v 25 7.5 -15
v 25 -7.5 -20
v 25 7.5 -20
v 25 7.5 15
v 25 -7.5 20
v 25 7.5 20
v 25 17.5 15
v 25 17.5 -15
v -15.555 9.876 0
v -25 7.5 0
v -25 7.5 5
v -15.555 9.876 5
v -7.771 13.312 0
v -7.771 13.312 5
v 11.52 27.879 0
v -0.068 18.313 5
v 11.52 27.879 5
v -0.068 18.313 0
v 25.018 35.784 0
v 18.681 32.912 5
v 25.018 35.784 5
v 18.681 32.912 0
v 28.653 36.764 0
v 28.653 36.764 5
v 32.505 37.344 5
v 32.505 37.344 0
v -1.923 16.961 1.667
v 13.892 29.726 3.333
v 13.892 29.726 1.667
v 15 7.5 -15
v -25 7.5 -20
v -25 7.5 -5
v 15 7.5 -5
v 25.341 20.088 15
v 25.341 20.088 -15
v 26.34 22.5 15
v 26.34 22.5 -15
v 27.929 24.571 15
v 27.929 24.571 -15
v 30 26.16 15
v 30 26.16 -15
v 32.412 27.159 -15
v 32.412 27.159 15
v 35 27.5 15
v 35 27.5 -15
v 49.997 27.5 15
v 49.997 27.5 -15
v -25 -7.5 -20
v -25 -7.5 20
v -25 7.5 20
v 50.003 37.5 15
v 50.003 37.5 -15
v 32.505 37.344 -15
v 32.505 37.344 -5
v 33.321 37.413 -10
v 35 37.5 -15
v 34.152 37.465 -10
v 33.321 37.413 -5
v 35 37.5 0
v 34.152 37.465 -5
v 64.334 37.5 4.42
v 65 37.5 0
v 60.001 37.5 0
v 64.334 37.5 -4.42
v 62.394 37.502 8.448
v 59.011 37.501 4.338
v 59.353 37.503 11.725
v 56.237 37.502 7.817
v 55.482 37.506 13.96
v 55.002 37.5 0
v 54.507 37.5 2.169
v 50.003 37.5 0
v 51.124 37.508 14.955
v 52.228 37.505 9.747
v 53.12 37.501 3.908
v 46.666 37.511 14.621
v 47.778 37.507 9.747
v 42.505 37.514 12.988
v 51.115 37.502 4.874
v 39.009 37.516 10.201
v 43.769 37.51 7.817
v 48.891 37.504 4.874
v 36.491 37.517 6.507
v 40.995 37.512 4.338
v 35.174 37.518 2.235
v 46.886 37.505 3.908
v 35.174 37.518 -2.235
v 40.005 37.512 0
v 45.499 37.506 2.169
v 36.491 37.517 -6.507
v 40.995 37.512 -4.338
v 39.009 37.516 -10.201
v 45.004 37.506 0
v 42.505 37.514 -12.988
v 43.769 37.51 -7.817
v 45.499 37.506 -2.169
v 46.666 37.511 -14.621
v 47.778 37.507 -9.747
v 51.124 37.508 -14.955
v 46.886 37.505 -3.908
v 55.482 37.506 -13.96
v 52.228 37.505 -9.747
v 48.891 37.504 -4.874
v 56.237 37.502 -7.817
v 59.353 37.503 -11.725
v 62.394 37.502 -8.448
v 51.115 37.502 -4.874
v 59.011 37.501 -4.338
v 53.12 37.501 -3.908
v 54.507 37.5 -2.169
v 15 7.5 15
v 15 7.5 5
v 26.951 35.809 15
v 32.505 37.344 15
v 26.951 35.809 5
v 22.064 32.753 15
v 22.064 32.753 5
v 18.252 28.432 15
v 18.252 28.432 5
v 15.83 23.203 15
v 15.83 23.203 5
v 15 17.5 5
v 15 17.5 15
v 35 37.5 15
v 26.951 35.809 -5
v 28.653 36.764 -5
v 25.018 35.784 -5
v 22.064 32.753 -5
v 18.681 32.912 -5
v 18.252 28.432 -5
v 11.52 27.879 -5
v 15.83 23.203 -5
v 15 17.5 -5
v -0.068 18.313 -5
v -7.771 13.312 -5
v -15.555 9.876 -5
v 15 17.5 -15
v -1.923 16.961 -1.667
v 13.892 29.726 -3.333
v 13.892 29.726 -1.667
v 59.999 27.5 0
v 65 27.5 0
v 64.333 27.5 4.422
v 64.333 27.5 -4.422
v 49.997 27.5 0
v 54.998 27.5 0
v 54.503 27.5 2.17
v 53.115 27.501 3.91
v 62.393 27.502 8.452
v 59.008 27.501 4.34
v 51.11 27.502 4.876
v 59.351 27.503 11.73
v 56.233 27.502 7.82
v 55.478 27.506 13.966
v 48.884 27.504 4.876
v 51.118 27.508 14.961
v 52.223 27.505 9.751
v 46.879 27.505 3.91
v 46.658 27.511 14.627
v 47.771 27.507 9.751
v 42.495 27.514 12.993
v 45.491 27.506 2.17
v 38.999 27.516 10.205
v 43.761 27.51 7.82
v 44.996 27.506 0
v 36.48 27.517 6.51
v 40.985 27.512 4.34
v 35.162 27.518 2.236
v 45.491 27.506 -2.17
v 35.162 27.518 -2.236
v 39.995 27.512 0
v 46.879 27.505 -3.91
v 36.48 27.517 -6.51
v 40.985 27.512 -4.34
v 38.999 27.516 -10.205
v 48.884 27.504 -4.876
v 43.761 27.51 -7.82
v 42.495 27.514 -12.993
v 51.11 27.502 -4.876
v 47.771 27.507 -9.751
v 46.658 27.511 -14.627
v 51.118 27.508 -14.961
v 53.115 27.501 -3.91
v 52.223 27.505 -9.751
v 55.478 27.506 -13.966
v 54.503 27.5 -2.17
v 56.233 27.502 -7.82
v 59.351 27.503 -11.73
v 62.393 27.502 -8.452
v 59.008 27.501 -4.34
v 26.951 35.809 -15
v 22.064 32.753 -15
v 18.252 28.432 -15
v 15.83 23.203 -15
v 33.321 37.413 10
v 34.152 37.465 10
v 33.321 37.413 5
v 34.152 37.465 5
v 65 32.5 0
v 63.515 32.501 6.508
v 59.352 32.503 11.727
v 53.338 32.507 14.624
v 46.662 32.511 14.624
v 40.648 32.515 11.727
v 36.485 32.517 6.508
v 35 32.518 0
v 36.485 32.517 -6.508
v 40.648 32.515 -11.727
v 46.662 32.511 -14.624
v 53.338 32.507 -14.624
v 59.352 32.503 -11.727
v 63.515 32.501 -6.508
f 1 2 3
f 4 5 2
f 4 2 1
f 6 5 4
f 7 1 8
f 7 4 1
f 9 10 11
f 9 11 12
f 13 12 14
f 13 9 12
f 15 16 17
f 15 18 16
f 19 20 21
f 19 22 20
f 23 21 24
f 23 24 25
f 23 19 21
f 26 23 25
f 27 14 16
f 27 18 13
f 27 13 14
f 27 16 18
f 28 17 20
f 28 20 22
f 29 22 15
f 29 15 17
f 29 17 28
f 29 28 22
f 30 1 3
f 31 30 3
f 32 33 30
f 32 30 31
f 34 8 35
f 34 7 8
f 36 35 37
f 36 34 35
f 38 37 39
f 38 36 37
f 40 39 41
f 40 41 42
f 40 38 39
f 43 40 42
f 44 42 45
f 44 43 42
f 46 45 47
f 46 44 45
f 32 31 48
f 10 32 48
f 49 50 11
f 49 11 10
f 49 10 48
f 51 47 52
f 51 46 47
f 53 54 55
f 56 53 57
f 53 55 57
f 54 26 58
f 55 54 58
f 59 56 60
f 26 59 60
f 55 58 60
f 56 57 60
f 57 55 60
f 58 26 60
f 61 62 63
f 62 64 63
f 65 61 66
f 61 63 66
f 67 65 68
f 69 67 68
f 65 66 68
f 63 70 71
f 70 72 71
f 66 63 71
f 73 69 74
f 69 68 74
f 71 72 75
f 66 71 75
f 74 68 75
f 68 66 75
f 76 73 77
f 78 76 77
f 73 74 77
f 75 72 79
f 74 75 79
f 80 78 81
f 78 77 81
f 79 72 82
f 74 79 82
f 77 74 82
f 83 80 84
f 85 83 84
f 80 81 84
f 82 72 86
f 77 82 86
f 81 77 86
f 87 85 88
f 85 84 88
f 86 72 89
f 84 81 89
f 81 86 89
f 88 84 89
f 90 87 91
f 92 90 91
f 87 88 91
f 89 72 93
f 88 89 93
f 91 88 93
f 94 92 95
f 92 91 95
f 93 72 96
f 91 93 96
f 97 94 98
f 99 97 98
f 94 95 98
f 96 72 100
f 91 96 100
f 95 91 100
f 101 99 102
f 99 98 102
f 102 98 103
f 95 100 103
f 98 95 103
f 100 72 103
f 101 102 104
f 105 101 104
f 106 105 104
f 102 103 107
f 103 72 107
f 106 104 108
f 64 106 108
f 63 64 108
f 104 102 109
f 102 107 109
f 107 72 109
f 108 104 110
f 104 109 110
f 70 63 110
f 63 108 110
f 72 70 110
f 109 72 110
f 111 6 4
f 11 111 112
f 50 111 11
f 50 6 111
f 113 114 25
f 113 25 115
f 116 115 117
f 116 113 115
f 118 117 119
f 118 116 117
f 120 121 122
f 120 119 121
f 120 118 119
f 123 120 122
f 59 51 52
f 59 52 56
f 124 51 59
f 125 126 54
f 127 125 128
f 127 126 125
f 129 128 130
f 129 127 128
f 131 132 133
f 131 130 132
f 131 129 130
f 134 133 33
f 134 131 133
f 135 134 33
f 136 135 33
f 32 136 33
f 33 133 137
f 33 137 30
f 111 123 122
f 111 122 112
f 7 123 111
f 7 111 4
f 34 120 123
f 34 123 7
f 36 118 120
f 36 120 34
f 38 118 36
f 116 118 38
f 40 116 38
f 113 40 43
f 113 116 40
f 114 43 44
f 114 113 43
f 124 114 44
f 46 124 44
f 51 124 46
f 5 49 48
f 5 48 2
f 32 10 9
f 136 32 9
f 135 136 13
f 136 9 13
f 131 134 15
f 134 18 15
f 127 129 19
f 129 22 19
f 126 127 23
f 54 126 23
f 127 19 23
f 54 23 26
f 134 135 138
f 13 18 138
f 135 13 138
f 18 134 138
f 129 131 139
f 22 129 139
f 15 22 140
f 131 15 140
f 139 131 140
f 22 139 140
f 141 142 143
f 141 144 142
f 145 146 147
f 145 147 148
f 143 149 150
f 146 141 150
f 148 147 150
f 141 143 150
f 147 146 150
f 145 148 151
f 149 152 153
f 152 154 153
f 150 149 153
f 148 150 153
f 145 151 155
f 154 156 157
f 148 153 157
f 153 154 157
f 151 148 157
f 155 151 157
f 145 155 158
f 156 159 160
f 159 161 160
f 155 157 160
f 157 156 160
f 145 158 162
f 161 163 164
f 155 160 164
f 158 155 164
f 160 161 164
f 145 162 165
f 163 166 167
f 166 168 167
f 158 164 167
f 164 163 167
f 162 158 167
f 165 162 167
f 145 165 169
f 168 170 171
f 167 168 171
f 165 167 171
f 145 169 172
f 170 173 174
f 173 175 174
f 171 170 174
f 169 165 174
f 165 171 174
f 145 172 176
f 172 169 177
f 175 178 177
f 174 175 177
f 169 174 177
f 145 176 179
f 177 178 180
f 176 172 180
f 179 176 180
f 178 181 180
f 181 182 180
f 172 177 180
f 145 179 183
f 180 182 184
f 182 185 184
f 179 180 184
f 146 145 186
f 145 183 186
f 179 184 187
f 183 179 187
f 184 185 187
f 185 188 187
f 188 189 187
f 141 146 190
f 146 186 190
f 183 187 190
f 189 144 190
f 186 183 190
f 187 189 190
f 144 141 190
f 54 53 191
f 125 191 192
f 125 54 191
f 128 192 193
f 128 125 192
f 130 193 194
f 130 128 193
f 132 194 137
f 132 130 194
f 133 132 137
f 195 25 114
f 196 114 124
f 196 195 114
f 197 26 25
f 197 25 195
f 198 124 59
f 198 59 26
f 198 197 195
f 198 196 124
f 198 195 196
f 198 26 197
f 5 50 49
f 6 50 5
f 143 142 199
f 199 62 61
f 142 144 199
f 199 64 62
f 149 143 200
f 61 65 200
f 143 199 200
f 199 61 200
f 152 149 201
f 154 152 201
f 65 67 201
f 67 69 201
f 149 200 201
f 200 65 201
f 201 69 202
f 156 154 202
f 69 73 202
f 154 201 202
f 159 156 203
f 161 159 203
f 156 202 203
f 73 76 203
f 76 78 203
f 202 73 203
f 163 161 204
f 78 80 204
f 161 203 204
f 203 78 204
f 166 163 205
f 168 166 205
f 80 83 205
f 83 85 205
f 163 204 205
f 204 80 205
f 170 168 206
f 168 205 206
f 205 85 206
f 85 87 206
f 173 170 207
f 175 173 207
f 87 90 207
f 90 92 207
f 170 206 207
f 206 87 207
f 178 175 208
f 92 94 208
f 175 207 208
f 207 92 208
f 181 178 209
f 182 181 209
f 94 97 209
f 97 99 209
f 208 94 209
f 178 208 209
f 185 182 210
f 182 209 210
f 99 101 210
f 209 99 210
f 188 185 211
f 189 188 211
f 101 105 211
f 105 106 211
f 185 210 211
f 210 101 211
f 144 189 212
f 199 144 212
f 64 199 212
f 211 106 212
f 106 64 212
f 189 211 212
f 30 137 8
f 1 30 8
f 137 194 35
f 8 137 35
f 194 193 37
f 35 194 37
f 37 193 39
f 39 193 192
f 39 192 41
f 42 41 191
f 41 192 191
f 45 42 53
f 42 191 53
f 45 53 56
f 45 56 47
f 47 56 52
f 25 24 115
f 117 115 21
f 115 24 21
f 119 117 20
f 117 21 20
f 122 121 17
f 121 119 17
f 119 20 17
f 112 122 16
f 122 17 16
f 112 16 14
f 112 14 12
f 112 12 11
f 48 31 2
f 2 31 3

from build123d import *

# Parameters (mm, degrees)
F1_DEPTH      = 20
F1_DEPTH_BACK = 20
F2_DEPTH      = 15
F2_DEPTH_BACK = 15
F3_DEPTH      = 5
F3_DEPTH_BACK = 5


with BuildPart() as f1:
    # F0 (on Top) → F1 (new body, two sides)
    with BuildSketch(Plane.XY) as f1_sk:
        Polygon((15, 7.5), (-25, 7.5), (-25, -7.5), (25, -7.5), (25, 7.5), align=None)
    extrude(amount=F1_DEPTH)
    extrude(f1_sk.sketch, amount=-F1_DEPTH_BACK)

    # F0 (on Top) → F2 (join, two sides)
    with BuildSketch(Plane.XY) as f2_sk:
        Polygon((50.0030305161, 37.5), (35, 37.5), (35, 37.1808245778), (35, 27.5), (49.9969694839, 27.5), align=None)
        with BuildLine():
            Line((15, 17.5), (15, 7.5))
            Line((15, 7.5), (25, 7.5))
            Line((25, 7.5), (25, 17.5))
            ThreePointArc((25, 17.5), (27.9289321881, 24.5710678119), (35, 27.5))
            Line((35, 27.5), (35, 37.1808245778))
            Line((35, 37.1808245778), (35, 37.5))
            add(Edge.make_bspline(
                [(32.5050636149, 37.3437721322), (33.3130240247, 37.4207640742), (34.1440455975, 37.4733642234), (35, 37.5)],
                knots=[64.8399400902, 64.8399400902, 64.8399400902, 64.8399400902, 67.082039325, 67.082039325, 67.082039325, 67.082039325], degree=3))
            ThreePointArc((32.5050636149, 37.3437721322), (20.0016879666, 30.7306702834), (15, 17.5))
        make_face()
    extrude(amount=F2_DEPTH)
    extrude(f2_sk.sketch, amount=-F2_DEPTH_BACK)

    # F0 (on Top) → F3 (join, two sides)
    with BuildSketch(Plane.XY) as f3_sk:
        with BuildLine():
            add(Edge.make_bspline(
                [(-25, 7.5), (5.0604127766, 12.4911778165), (9.1394142449, 35.1172190736), (32.5050636149, 37.3437721322)],
                knots=[0, 0, 0, 0, 64.8399400902, 64.8399400902, 64.8399400902, 64.8399400902], degree=3))
            Line((-25, 7.5), (15, 7.5))
            Line((15, 7.5), (15, 17.5))
            ThreePointArc((15, 17.5), (20.0016879666, 30.7306702834), (32.5050636149, 37.3437721322))
        make_face()
    extrude(amount=F3_DEPTH)
    extrude(f3_sk.sketch, amount=-F3_DEPTH_BACK)


with BuildPart() as f4:
    # F0 (on Top) → F4 (revolve)
    with BuildSketch(Plane.XY):
        Polygon((65, 37.5), (50.0030305161, 37.5), (49.9969694839, 27.5), (65, 27.5), align=None)
    revolve(axis=Axis((50, 32.5, 0), (-0.0006061031, -0.9999998163, 0)))


solid = Compound([f1.part, f4.part])
